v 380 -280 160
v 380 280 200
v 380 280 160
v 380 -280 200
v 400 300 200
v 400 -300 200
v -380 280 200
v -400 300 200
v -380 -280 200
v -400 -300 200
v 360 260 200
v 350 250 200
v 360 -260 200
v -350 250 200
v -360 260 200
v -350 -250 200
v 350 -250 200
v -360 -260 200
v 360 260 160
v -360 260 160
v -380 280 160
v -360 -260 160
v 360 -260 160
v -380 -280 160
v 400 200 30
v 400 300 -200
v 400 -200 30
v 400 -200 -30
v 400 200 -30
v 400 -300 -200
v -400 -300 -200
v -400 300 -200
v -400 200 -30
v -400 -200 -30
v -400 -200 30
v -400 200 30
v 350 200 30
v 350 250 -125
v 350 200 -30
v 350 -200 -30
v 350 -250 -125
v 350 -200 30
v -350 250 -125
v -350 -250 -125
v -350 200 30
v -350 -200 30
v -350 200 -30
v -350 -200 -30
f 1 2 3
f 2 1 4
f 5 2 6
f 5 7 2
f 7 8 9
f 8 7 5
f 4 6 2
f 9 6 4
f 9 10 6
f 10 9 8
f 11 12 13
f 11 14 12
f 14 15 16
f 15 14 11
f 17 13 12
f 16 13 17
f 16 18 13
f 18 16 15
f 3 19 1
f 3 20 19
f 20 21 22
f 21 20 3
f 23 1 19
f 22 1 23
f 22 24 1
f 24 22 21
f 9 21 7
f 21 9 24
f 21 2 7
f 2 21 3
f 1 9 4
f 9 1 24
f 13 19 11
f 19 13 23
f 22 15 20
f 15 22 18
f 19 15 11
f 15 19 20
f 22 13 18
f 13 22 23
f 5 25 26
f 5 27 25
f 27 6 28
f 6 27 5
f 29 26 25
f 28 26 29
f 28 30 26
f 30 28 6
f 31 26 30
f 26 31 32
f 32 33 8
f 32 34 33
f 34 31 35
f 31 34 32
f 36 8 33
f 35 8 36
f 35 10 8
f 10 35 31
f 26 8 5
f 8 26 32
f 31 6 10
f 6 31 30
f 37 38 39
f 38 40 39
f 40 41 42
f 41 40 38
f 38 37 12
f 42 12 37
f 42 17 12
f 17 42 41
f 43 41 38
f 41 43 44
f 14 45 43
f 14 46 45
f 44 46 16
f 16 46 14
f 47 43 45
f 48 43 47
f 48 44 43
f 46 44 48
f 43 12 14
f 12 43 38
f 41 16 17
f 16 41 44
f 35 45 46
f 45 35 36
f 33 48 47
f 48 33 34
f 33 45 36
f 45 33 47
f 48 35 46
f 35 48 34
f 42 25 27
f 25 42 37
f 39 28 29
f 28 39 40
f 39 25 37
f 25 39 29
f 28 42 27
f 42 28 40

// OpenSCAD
// =========================================================================
// GRUMMAN-STYLED INFLATABLE CARRIER - CONNECTOR SHIELDING ENCLOSURE
// MANUFACTURER: HUNTINGTON INGALLS / NEWPORT NEWS SHIPBUILDING
// MATERIAL PROFILE: GRADE 5 TITANIUM JUNCTION BOX WITH SEALING GROOVES
// =========================================================================

module ribbon_connector_shield(box_l=800, box_w=600, box_h=400) {
    // Heavy-duty physical enclosure surrounding the 24-pin inter-plate ribbon block
    difference() {
        // Solid Titanium Outer Protective Block
        cube([box_l, box_w, box_h], center=true);
        
        // Internal Cavity for Ribbon Terminal Block Board Mounting
        translate([0, 0, 50])
            cube([box_l - 100, box_w - 100, box_h - 50], center=true);
            
        // Forward Ingress Slit for Flat Foil Power Conduit Ribbon Entry
        translate([-box_l/2, 0, 0])
            cube([120, box_w - 200, 60], center=true);
            
        // Aft Egress Slit for Flat Foil Power Conduit Ribbon Exit
        translate([box_l/2, 0, 0])
            cube([120, box_w - 200, 60], center=true);
            
        // Weatherproof Sealing Groove (Holds high-durability fluoropolymer gasket)
        translate([0, 0, box_h/2 - 20])
            difference() {
                cube([box_l - 40, box_w - 40, 40], center=true);
                cube([box_l - 80, box_w - 80, 50], center=true);
            }
    }
}

// Instantiate junction box shield layout
ribbon_connector_shield();
